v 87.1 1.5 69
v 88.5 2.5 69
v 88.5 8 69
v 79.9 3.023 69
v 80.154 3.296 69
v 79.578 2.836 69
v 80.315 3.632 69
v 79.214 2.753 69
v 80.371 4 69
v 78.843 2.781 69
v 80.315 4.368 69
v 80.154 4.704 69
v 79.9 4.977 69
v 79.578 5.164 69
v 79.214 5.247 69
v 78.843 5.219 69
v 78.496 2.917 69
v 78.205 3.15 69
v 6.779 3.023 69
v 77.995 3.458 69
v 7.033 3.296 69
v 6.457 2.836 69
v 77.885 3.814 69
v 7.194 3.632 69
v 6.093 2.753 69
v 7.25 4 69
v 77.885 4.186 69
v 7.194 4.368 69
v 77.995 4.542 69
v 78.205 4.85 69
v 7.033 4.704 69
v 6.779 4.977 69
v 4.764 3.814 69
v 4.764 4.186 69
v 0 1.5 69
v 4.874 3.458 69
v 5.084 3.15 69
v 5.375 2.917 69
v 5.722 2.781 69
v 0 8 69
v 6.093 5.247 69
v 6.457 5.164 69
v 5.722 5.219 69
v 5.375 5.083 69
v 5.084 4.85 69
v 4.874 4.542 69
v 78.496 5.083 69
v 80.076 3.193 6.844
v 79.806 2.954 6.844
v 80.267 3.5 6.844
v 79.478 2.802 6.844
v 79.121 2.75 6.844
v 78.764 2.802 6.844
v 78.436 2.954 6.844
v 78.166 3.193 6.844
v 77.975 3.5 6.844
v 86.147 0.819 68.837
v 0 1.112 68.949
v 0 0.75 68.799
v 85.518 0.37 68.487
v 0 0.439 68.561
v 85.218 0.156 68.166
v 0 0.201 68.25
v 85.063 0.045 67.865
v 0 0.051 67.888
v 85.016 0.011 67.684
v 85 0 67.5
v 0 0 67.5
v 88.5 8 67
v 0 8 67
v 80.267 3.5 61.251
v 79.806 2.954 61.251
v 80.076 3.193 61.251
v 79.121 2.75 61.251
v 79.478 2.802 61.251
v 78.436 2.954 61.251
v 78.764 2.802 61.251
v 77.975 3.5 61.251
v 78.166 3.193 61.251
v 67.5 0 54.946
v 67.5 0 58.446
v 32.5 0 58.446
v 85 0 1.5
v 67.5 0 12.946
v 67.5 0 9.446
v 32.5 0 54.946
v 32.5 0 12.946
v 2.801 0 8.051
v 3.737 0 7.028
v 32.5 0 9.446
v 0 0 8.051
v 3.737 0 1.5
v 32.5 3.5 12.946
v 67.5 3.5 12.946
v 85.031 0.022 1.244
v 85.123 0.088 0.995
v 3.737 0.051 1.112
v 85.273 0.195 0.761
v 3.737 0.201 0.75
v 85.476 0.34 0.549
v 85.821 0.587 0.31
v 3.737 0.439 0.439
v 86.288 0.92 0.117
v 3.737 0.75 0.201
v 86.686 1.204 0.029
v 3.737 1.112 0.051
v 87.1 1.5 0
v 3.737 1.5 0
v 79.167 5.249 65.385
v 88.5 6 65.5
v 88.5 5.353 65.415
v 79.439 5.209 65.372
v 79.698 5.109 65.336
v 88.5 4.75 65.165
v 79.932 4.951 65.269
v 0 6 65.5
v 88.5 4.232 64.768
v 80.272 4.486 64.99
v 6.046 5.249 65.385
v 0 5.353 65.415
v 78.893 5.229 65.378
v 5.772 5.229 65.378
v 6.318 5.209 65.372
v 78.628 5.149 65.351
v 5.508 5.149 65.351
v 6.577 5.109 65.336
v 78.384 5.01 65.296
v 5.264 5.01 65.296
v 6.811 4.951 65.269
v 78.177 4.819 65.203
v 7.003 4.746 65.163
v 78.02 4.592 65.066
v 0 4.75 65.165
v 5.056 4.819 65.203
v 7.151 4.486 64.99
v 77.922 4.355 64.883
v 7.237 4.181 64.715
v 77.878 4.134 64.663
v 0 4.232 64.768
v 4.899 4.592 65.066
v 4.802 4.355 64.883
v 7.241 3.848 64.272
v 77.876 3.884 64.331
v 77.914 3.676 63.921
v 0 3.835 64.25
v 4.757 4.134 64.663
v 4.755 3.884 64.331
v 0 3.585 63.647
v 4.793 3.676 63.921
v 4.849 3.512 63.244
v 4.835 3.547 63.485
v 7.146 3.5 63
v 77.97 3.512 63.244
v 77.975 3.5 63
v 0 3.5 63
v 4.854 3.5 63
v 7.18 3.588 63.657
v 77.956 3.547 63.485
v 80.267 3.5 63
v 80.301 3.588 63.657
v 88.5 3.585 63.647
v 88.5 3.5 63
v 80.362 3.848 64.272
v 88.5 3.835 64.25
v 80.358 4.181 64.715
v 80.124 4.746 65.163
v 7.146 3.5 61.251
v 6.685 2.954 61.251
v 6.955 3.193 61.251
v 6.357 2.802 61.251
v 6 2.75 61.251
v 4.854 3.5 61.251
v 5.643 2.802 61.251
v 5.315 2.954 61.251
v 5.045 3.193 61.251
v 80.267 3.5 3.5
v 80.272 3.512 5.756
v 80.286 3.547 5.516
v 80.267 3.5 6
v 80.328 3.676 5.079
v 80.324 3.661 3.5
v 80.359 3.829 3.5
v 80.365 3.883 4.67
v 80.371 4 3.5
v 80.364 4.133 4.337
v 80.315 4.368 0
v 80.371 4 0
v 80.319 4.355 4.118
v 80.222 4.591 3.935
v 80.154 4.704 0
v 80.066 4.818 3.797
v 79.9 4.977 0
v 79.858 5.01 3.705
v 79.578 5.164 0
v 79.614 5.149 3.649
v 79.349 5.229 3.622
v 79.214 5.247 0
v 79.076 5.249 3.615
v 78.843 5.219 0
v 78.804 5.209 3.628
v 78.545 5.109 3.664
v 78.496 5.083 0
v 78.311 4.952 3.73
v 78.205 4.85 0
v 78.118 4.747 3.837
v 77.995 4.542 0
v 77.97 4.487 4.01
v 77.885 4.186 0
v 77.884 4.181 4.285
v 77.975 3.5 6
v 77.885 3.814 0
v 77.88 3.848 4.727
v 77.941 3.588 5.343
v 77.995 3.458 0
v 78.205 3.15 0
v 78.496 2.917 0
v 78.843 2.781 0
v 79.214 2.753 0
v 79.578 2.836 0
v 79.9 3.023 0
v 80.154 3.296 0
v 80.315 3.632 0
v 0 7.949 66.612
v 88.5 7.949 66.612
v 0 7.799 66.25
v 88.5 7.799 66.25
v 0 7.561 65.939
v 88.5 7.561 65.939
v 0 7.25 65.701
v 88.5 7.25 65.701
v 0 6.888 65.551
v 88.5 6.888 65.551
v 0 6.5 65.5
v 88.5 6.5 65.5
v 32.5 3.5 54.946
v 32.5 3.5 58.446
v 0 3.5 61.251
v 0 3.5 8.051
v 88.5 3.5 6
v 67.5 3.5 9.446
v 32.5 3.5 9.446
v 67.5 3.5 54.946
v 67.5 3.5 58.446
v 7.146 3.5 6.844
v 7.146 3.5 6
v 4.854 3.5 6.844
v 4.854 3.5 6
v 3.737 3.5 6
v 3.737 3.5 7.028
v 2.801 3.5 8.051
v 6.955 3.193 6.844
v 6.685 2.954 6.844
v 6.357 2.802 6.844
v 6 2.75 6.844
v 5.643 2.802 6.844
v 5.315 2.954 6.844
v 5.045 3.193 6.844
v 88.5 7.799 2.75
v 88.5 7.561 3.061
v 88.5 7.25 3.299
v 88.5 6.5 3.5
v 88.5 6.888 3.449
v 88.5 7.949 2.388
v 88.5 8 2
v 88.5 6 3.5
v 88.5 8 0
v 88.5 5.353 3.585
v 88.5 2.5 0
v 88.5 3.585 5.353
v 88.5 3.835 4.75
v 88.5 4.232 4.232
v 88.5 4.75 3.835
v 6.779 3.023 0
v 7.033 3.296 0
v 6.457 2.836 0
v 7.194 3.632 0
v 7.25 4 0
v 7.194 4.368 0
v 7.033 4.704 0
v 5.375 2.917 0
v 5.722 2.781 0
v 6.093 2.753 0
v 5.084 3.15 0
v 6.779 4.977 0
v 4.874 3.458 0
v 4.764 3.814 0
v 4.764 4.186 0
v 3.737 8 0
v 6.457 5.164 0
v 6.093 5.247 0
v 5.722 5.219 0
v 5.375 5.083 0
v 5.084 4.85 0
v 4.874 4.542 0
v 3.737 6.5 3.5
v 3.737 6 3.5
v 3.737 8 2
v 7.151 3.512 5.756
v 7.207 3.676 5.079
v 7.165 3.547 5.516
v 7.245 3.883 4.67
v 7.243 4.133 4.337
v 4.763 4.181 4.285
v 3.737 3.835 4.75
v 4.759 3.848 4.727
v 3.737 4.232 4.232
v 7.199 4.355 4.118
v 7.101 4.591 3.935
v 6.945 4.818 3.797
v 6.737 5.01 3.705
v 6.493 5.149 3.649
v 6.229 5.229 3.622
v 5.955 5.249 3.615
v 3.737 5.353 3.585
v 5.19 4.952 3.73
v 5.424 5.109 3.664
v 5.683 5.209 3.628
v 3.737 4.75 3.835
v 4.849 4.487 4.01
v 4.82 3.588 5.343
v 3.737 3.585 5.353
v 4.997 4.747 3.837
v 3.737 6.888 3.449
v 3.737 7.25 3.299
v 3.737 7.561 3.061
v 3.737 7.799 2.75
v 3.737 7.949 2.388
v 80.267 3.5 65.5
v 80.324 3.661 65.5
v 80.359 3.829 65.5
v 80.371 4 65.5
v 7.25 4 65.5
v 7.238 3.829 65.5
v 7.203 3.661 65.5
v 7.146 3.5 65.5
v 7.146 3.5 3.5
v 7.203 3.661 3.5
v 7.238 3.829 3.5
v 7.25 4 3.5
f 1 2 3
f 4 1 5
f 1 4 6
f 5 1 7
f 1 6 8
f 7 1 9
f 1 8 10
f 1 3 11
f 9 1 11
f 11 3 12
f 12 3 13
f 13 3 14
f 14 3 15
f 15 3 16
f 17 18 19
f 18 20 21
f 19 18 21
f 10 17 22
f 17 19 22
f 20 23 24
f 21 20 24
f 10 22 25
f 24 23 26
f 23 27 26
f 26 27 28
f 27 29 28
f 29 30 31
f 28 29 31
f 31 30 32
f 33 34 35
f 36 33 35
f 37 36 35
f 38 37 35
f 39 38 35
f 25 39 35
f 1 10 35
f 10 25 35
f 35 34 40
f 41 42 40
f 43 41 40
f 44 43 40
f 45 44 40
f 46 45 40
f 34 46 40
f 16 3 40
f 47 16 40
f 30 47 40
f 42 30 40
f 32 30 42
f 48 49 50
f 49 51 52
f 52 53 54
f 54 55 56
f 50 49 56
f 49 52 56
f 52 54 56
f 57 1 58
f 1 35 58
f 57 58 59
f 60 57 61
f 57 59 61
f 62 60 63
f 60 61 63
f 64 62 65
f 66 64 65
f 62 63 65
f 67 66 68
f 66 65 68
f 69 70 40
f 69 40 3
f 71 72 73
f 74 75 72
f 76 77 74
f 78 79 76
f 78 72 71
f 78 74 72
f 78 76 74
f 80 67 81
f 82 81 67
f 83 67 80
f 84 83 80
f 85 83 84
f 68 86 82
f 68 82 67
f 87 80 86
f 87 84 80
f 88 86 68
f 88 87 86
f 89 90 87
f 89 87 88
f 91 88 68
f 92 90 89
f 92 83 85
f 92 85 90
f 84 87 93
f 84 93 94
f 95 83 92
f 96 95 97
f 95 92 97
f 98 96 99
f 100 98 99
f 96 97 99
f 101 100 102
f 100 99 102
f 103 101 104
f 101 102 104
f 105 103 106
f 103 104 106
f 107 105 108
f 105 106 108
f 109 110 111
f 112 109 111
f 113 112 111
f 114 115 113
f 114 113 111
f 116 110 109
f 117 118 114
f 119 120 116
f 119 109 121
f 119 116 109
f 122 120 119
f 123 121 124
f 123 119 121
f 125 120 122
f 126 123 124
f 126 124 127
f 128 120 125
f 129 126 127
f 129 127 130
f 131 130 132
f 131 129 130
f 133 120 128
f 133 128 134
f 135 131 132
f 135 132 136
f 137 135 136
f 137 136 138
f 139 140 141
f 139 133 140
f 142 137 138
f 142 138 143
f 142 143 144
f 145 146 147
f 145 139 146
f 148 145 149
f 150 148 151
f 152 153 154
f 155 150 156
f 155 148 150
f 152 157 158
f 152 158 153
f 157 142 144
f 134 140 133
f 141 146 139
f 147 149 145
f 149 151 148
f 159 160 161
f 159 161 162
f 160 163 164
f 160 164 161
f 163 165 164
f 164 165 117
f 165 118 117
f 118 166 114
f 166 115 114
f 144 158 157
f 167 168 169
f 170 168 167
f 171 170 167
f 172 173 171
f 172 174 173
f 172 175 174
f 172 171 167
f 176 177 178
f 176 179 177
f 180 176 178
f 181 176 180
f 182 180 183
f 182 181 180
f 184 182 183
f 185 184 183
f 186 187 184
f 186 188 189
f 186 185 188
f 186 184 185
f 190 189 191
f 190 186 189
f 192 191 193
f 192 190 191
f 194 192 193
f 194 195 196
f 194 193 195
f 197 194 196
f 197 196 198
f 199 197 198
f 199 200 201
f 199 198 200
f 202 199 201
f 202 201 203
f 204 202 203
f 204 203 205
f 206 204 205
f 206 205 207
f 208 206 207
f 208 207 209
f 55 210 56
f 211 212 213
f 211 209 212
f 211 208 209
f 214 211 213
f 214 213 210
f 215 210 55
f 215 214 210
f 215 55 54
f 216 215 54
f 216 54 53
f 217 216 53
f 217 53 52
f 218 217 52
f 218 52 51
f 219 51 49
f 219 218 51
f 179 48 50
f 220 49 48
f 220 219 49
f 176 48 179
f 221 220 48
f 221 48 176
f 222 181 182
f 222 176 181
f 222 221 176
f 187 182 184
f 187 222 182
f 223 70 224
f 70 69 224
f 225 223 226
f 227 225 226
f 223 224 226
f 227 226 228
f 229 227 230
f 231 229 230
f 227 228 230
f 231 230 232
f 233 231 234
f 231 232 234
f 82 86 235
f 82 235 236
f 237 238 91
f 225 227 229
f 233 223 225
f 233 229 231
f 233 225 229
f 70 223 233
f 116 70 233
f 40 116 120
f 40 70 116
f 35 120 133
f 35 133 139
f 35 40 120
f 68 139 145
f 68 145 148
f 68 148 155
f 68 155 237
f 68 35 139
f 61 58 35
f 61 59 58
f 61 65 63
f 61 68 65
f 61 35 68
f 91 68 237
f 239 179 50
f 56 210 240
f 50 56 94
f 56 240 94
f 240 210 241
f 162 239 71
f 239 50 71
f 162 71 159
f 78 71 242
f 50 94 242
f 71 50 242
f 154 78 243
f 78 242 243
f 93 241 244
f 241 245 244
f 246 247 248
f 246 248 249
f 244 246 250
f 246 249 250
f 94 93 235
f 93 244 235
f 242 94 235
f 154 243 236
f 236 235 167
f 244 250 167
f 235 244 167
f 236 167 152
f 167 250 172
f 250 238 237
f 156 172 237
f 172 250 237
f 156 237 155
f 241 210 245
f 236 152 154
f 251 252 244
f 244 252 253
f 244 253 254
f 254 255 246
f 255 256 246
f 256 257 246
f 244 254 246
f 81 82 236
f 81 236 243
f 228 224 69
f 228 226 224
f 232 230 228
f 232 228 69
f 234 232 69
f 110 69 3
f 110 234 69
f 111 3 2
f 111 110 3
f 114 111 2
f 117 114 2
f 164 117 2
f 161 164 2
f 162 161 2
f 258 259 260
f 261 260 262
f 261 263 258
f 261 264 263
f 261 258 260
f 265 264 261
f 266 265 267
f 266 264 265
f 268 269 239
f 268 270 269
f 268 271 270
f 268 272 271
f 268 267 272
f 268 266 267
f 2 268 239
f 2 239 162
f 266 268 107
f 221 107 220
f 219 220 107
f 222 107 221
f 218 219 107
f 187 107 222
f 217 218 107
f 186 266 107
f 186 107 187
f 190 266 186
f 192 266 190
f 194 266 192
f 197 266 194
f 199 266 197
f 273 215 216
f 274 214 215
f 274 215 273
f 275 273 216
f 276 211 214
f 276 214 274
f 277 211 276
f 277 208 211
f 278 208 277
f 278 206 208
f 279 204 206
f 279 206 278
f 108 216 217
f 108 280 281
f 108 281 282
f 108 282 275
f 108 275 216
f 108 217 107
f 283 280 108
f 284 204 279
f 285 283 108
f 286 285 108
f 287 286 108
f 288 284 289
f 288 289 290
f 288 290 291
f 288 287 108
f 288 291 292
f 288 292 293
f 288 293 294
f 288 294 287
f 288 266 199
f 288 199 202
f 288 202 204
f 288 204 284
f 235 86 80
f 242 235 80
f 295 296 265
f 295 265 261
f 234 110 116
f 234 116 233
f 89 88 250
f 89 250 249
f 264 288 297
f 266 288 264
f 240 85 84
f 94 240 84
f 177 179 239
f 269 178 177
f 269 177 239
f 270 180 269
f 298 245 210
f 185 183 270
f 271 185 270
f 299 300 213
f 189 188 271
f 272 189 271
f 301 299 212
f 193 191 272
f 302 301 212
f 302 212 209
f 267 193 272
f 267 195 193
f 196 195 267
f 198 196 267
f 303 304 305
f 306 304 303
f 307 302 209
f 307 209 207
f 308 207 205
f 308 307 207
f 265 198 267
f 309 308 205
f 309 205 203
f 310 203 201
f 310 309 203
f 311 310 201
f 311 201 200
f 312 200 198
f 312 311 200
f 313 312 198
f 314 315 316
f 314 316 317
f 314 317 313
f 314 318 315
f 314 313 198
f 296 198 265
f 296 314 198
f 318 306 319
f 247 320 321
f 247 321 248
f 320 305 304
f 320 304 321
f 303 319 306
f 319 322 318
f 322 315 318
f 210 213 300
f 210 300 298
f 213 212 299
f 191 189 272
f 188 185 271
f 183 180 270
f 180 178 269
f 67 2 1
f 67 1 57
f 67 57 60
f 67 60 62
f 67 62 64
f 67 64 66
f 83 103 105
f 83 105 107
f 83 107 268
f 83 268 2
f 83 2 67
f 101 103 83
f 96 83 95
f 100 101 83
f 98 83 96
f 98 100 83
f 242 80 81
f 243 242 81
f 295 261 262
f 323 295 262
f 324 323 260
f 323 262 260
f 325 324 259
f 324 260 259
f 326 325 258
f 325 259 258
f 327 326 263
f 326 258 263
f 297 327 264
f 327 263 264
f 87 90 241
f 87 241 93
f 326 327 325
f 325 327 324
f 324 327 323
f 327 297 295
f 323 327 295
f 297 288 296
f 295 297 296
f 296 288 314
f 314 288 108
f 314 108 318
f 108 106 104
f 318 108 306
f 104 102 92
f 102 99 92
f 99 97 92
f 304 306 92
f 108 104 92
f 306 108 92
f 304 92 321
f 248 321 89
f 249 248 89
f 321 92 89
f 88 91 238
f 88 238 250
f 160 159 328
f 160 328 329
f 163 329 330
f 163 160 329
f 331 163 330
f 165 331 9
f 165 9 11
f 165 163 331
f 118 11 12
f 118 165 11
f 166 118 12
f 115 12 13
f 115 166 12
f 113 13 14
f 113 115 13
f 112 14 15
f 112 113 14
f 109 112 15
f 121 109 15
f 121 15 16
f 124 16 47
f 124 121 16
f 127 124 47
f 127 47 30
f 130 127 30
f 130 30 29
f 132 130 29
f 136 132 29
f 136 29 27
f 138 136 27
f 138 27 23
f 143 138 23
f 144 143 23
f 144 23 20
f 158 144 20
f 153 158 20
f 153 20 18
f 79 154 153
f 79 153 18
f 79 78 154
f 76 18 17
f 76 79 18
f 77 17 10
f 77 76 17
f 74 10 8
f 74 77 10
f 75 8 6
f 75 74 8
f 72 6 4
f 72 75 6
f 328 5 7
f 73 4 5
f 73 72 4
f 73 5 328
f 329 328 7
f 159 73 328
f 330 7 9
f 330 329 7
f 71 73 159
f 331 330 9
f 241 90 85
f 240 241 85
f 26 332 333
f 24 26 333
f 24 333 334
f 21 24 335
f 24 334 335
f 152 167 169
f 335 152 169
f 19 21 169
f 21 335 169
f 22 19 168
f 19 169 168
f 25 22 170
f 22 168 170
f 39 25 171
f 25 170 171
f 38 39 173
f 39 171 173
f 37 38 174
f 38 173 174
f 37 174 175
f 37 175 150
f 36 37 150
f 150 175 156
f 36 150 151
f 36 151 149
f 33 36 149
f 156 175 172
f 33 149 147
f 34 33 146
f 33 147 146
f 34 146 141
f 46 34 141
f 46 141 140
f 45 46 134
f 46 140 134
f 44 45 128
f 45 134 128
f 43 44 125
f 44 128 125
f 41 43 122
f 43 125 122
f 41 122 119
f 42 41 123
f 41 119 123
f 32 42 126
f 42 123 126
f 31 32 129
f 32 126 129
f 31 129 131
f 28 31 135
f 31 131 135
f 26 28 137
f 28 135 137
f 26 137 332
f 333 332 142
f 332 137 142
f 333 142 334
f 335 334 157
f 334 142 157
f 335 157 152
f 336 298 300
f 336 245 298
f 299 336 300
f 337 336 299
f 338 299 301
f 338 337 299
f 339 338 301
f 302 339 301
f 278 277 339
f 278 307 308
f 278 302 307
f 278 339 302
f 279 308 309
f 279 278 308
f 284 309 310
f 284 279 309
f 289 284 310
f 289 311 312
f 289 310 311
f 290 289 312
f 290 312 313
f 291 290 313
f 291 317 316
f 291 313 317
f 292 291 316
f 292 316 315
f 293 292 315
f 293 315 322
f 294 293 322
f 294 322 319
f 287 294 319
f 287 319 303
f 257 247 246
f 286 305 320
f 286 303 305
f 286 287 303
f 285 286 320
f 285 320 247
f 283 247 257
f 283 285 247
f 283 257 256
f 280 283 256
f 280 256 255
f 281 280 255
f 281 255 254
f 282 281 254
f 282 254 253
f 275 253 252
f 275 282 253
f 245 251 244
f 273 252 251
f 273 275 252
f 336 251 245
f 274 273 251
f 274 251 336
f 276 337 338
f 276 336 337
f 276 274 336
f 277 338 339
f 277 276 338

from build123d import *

# Parameters (mm, degrees)
SKETCH2_R           = 1.25
BOSS_EXTRUDE1_DEPTH = 69
SKETCH3_W           = 62
SKETCH3_H           = 4.5
CUT_EXTRUDE1_DEPTH  = 113.504444357
SKETCH4_W           = 54.406446317
SKETCH4_H           = 2.417375431
BOSS_EXTRUDE2_DEPTH = 83
FILLET1_R           = 1.5
FILLET2_R           = 2.5
FILLET3_R           = 1.5
CUT_EXTRUDE3_DEPTH  = 113.504444497
CUT_EXTRUDE5_REACH  = 114.504
SKETCH7_W           = 35
SKETCH7_H           = 3.5


with BuildPart() as part:
    # Sketch2 → Boss-Extrude1 (new body)
    with BuildSketch(Plane.XY):
        Polygon((0, 0), (0, 8), (88.5, 8), (88.5, 2.5), (85, 0), align=None)
        with Locations((6.000001876, 4)):
            Circle(SKETCH2_R, mode=Mode.SUBTRACT)
        with Locations((79.120881892, 4)):
            Circle(SKETCH2_R, mode=Mode.SUBTRACT)
    extrude(amount=BOSS_EXTRUDE1_DEPTH)

    # Sketch3 → Cut-Extrude1 (cut, through all)
    with BuildSketch(Plane.ZY):
        with Locations((34.5, 5.75)):
            Rectangle(SKETCH3_W, SKETCH3_H)
    extrude(amount=-CUT_EXTRUDE1_DEPTH, mode=Mode.SUBTRACT)

    # Sketch4 → Boss-Extrude2 (add)
    with BuildSketch(Plane.ZY):
        with Locations((34.04742318, 2.291312285)):
            Rectangle(SKETCH4_W, SKETCH4_H)
    extrude(amount=-BOSS_EXTRUDE2_DEPTH)

    # Fillet1
    fillet1_edges = [part.edges().sort_by_distance(p)[0] for p in [
        (42.5, 0, 69),
        (42.5, 0, 0),
    ]]
    fillet(fillet1_edges, radius=FILLET1_R)

    # Fillet2
    # the kernel refuses this fillet: 2.5 mm, written as the material it adds along each edge
    with BuildSketch(Plane(origin=(0, 3.5, 65.5), x_dir=(0, 0, -1), z_dir=(1, 0, 0))) as fillet2_piece_1_section:
        with BuildLine():
            CenterArc((FILLET2_R, FILLET2_R), FILLET2_R, 180, 90)
            Line((0, FILLET2_R), (0, 0))
            Line((0, 0), (FILLET2_R, 0))
        make_face()
    fillet2_piece_1 = extrude(amount=11.104357952, mode=Mode.PRIVATE)
    fillet2_piece_1 = fillet2_piece_1 - Plane(origin=(6.000001876, 4, 63.653309705), x_dir=(1, 0, 0), z_dir=(0, 0, -1)) * Cylinder(1.25, 33, mode=Mode.PRIVATE)
    add(fillet2_piece_1)
    with BuildSketch(Plane(origin=(0.8956458, 3.5, 65.5), x_dir=(0, 0, -1), z_dir=(1, 0, 0))) as fillet2_piece_2_section:
        with BuildLine():
            CenterArc((FILLET2_R, FILLET2_R), FILLET2_R, 180, 90)
            Line((0, FILLET2_R), (0, 0))
            Line((0, 0), (FILLET2_R, 0))
        make_face()
    fillet2_piece_2 = extrude(amount=83.329592169, mode=Mode.PRIVATE)
    fillet2_piece_2 = fillet2_piece_2 - Plane(origin=(6.000001876, 4, 64.936218349), x_dir=(1, 0, 0), z_dir=(0, 0, -1)) * Cylinder(1.25, 177, mode=Mode.PRIVATE)
    fillet2_piece_2 = fillet2_piece_2 - Plane(origin=(79.120881892, 4, 64.936218349), x_dir=(1, 0, 0), z_dir=(0, 0, -1)) * Cylinder(1.25, 177, mode=Mode.PRIVATE)
    add(fillet2_piece_2)
    with BuildSketch(Plane(origin=(0, 3.5, 3.5), x_dir=(0, 1, 0), z_dir=(1, 0, 0))) as fillet2_piece_3_section:
        with BuildLine():
            CenterArc((FILLET2_R, FILLET2_R), FILLET2_R, 180, 90)
            Line((0, FILLET2_R), (0, 0))
            Line((0, 0), (FILLET2_R, 0))
        make_face()
    fillet2_piece_3 = extrude(amount=11.104357952, mode=Mode.PRIVATE)
    fillet2_piece_3 = fillet2_piece_3 - Plane(origin=(6.000001876, 4, 3.561814983), x_dir=(1, 0, 0), z_dir=(0, 0, -1)) * Cylinder(1.25, 33, mode=Mode.PRIVATE)
    add(fillet2_piece_3)
    with BuildSketch(Plane(origin=(74.016525816, 3.5, 3.5), x_dir=(0, 1, 0), z_dir=(1, 0, 0))) as fillet2_piece_4_section:
        with BuildLine():
            CenterArc((FILLET2_R, FILLET2_R), FILLET2_R, 180, 90)
            Line((0, FILLET2_R), (0, 0))
            Line((0, 0), (FILLET2_R, 0))
        make_face()
    fillet2_piece_4 = extrude(amount=14.483474184, mode=Mode.PRIVATE)
    fillet2_piece_4 = fillet2_piece_4 - Plane(origin=(79.120881892, 4, 4.058892955), x_dir=(1, 0, 0), z_dir=(0, 0, -1)) * Cylinder(1.25, 39, mode=Mode.PRIVATE)
    add(fillet2_piece_4)
    with BuildSketch(Plane(origin=(0.8956458, 3.5, 3.5), x_dir=(0, 1, 0), z_dir=(1, 0, 0))) as fillet2_piece_5_section:
        with BuildLine():
            CenterArc((FILLET2_R, FILLET2_R), FILLET2_R, 180, 90)
            Line((0, FILLET2_R), (0, 0))
            Line((0, 0), (FILLET2_R, 0))
        make_face()
    fillet2_piece_5 = extrude(amount=83.329592169, mode=Mode.PRIVATE)
    fillet2_piece_5 = fillet2_piece_5 - Plane(origin=(79.120881892, 4, 4.063781674), x_dir=(1, 0, 0), z_dir=(0, 0, -1)) * Cylinder(1.25, 177, mode=Mode.PRIVATE)
    fillet2_piece_5 = fillet2_piece_5 - Plane(origin=(6.000001876, 4, 4.063781674), x_dir=(1, 0, 0), z_dir=(0, 0, -1)) * Cylinder(1.25, 177, mode=Mode.PRIVATE)
    add(fillet2_piece_5)
    with BuildSketch(Plane(origin=(74.016525816, 3.5, 65.5), x_dir=(0, 0, -1), z_dir=(1, 0, 0))) as fillet2_piece_6_section:
        with BuildLine():
            CenterArc((FILLET2_R, FILLET2_R), FILLET2_R, 180, 90)
            Line((0, FILLET2_R), (0, 0))
            Line((0, 0), (FILLET2_R, 0))
        make_face()
    fillet2_piece_6 = extrude(amount=14.483474184, mode=Mode.PRIVATE)
    fillet2_piece_6 = fillet2_piece_6 - Plane(origin=(79.120881892, 4, 64.941107203), x_dir=(1, 0, 0), z_dir=(0, 0, -1)) * Cylinder(1.25, 39, mode=Mode.PRIVATE)
    add(fillet2_piece_6)

    # Fillet3
    fillet3_edges = [part.edges().sort_by_distance(p)[0] for p in [
        (44.25, 8, 3.5),
        (44.25, 8, 65.5),
    ]]
    fillet(fillet3_edges, radius=FILLET3_R)

    # Sketch6 → Cut-Extrude3 (cut, through all)
    with BuildSketch(Plane.XZ):
        Polygon((-1.398299913, 8.05064563), (2.800616001, 8.05064563), (3.736645897, 7.027940595), (3.736645897, 1.098360778), (3.736645897, 0), (-1.236121559, -1.139461127), align=None)
    extrude(amount=-CUT_EXTRUDE3_DEPTH, mode=Mode.SUBTRACT)

    # Sketch7 → Cut-Extrude5 (cut, up to next)
    with BuildSketch(Plane.XZ, mode=Mode.PRIVATE) as cut_extrude5_sk1:
        with Locations((50, 56.69585569)):
            Rectangle(SKETCH7_W, SKETCH7_H)
    cut_extrude5_tool1 = extrude(cut_extrude5_sk1.sketch, amount=-CUT_EXTRUDE5_REACH, mode=Mode.PRIVATE) & part.part
    # Sketch7 → Cut-Extrude5 (cut, up to next)
    with BuildSketch(Plane.XZ, mode=Mode.PRIVATE) as cut_extrude5_sk2:
        with Locations((50, 11.19585569)):
            Rectangle(SKETCH7_W, SKETCH7_H)
    cut_extrude5_tool2 = extrude(cut_extrude5_sk2.sketch, amount=-CUT_EXTRUDE5_REACH, mode=Mode.PRIVATE) & part.part
    add(cut_extrude5_tool1.solids().sort_by_distance((50, 0, 56.695856))[0], mode=Mode.SUBTRACT)
    add(cut_extrude5_tool2.solids().sort_by_distance((50, 0, 11.195856))[0], mode=Mode.SUBTRACT)


solid = part.part
